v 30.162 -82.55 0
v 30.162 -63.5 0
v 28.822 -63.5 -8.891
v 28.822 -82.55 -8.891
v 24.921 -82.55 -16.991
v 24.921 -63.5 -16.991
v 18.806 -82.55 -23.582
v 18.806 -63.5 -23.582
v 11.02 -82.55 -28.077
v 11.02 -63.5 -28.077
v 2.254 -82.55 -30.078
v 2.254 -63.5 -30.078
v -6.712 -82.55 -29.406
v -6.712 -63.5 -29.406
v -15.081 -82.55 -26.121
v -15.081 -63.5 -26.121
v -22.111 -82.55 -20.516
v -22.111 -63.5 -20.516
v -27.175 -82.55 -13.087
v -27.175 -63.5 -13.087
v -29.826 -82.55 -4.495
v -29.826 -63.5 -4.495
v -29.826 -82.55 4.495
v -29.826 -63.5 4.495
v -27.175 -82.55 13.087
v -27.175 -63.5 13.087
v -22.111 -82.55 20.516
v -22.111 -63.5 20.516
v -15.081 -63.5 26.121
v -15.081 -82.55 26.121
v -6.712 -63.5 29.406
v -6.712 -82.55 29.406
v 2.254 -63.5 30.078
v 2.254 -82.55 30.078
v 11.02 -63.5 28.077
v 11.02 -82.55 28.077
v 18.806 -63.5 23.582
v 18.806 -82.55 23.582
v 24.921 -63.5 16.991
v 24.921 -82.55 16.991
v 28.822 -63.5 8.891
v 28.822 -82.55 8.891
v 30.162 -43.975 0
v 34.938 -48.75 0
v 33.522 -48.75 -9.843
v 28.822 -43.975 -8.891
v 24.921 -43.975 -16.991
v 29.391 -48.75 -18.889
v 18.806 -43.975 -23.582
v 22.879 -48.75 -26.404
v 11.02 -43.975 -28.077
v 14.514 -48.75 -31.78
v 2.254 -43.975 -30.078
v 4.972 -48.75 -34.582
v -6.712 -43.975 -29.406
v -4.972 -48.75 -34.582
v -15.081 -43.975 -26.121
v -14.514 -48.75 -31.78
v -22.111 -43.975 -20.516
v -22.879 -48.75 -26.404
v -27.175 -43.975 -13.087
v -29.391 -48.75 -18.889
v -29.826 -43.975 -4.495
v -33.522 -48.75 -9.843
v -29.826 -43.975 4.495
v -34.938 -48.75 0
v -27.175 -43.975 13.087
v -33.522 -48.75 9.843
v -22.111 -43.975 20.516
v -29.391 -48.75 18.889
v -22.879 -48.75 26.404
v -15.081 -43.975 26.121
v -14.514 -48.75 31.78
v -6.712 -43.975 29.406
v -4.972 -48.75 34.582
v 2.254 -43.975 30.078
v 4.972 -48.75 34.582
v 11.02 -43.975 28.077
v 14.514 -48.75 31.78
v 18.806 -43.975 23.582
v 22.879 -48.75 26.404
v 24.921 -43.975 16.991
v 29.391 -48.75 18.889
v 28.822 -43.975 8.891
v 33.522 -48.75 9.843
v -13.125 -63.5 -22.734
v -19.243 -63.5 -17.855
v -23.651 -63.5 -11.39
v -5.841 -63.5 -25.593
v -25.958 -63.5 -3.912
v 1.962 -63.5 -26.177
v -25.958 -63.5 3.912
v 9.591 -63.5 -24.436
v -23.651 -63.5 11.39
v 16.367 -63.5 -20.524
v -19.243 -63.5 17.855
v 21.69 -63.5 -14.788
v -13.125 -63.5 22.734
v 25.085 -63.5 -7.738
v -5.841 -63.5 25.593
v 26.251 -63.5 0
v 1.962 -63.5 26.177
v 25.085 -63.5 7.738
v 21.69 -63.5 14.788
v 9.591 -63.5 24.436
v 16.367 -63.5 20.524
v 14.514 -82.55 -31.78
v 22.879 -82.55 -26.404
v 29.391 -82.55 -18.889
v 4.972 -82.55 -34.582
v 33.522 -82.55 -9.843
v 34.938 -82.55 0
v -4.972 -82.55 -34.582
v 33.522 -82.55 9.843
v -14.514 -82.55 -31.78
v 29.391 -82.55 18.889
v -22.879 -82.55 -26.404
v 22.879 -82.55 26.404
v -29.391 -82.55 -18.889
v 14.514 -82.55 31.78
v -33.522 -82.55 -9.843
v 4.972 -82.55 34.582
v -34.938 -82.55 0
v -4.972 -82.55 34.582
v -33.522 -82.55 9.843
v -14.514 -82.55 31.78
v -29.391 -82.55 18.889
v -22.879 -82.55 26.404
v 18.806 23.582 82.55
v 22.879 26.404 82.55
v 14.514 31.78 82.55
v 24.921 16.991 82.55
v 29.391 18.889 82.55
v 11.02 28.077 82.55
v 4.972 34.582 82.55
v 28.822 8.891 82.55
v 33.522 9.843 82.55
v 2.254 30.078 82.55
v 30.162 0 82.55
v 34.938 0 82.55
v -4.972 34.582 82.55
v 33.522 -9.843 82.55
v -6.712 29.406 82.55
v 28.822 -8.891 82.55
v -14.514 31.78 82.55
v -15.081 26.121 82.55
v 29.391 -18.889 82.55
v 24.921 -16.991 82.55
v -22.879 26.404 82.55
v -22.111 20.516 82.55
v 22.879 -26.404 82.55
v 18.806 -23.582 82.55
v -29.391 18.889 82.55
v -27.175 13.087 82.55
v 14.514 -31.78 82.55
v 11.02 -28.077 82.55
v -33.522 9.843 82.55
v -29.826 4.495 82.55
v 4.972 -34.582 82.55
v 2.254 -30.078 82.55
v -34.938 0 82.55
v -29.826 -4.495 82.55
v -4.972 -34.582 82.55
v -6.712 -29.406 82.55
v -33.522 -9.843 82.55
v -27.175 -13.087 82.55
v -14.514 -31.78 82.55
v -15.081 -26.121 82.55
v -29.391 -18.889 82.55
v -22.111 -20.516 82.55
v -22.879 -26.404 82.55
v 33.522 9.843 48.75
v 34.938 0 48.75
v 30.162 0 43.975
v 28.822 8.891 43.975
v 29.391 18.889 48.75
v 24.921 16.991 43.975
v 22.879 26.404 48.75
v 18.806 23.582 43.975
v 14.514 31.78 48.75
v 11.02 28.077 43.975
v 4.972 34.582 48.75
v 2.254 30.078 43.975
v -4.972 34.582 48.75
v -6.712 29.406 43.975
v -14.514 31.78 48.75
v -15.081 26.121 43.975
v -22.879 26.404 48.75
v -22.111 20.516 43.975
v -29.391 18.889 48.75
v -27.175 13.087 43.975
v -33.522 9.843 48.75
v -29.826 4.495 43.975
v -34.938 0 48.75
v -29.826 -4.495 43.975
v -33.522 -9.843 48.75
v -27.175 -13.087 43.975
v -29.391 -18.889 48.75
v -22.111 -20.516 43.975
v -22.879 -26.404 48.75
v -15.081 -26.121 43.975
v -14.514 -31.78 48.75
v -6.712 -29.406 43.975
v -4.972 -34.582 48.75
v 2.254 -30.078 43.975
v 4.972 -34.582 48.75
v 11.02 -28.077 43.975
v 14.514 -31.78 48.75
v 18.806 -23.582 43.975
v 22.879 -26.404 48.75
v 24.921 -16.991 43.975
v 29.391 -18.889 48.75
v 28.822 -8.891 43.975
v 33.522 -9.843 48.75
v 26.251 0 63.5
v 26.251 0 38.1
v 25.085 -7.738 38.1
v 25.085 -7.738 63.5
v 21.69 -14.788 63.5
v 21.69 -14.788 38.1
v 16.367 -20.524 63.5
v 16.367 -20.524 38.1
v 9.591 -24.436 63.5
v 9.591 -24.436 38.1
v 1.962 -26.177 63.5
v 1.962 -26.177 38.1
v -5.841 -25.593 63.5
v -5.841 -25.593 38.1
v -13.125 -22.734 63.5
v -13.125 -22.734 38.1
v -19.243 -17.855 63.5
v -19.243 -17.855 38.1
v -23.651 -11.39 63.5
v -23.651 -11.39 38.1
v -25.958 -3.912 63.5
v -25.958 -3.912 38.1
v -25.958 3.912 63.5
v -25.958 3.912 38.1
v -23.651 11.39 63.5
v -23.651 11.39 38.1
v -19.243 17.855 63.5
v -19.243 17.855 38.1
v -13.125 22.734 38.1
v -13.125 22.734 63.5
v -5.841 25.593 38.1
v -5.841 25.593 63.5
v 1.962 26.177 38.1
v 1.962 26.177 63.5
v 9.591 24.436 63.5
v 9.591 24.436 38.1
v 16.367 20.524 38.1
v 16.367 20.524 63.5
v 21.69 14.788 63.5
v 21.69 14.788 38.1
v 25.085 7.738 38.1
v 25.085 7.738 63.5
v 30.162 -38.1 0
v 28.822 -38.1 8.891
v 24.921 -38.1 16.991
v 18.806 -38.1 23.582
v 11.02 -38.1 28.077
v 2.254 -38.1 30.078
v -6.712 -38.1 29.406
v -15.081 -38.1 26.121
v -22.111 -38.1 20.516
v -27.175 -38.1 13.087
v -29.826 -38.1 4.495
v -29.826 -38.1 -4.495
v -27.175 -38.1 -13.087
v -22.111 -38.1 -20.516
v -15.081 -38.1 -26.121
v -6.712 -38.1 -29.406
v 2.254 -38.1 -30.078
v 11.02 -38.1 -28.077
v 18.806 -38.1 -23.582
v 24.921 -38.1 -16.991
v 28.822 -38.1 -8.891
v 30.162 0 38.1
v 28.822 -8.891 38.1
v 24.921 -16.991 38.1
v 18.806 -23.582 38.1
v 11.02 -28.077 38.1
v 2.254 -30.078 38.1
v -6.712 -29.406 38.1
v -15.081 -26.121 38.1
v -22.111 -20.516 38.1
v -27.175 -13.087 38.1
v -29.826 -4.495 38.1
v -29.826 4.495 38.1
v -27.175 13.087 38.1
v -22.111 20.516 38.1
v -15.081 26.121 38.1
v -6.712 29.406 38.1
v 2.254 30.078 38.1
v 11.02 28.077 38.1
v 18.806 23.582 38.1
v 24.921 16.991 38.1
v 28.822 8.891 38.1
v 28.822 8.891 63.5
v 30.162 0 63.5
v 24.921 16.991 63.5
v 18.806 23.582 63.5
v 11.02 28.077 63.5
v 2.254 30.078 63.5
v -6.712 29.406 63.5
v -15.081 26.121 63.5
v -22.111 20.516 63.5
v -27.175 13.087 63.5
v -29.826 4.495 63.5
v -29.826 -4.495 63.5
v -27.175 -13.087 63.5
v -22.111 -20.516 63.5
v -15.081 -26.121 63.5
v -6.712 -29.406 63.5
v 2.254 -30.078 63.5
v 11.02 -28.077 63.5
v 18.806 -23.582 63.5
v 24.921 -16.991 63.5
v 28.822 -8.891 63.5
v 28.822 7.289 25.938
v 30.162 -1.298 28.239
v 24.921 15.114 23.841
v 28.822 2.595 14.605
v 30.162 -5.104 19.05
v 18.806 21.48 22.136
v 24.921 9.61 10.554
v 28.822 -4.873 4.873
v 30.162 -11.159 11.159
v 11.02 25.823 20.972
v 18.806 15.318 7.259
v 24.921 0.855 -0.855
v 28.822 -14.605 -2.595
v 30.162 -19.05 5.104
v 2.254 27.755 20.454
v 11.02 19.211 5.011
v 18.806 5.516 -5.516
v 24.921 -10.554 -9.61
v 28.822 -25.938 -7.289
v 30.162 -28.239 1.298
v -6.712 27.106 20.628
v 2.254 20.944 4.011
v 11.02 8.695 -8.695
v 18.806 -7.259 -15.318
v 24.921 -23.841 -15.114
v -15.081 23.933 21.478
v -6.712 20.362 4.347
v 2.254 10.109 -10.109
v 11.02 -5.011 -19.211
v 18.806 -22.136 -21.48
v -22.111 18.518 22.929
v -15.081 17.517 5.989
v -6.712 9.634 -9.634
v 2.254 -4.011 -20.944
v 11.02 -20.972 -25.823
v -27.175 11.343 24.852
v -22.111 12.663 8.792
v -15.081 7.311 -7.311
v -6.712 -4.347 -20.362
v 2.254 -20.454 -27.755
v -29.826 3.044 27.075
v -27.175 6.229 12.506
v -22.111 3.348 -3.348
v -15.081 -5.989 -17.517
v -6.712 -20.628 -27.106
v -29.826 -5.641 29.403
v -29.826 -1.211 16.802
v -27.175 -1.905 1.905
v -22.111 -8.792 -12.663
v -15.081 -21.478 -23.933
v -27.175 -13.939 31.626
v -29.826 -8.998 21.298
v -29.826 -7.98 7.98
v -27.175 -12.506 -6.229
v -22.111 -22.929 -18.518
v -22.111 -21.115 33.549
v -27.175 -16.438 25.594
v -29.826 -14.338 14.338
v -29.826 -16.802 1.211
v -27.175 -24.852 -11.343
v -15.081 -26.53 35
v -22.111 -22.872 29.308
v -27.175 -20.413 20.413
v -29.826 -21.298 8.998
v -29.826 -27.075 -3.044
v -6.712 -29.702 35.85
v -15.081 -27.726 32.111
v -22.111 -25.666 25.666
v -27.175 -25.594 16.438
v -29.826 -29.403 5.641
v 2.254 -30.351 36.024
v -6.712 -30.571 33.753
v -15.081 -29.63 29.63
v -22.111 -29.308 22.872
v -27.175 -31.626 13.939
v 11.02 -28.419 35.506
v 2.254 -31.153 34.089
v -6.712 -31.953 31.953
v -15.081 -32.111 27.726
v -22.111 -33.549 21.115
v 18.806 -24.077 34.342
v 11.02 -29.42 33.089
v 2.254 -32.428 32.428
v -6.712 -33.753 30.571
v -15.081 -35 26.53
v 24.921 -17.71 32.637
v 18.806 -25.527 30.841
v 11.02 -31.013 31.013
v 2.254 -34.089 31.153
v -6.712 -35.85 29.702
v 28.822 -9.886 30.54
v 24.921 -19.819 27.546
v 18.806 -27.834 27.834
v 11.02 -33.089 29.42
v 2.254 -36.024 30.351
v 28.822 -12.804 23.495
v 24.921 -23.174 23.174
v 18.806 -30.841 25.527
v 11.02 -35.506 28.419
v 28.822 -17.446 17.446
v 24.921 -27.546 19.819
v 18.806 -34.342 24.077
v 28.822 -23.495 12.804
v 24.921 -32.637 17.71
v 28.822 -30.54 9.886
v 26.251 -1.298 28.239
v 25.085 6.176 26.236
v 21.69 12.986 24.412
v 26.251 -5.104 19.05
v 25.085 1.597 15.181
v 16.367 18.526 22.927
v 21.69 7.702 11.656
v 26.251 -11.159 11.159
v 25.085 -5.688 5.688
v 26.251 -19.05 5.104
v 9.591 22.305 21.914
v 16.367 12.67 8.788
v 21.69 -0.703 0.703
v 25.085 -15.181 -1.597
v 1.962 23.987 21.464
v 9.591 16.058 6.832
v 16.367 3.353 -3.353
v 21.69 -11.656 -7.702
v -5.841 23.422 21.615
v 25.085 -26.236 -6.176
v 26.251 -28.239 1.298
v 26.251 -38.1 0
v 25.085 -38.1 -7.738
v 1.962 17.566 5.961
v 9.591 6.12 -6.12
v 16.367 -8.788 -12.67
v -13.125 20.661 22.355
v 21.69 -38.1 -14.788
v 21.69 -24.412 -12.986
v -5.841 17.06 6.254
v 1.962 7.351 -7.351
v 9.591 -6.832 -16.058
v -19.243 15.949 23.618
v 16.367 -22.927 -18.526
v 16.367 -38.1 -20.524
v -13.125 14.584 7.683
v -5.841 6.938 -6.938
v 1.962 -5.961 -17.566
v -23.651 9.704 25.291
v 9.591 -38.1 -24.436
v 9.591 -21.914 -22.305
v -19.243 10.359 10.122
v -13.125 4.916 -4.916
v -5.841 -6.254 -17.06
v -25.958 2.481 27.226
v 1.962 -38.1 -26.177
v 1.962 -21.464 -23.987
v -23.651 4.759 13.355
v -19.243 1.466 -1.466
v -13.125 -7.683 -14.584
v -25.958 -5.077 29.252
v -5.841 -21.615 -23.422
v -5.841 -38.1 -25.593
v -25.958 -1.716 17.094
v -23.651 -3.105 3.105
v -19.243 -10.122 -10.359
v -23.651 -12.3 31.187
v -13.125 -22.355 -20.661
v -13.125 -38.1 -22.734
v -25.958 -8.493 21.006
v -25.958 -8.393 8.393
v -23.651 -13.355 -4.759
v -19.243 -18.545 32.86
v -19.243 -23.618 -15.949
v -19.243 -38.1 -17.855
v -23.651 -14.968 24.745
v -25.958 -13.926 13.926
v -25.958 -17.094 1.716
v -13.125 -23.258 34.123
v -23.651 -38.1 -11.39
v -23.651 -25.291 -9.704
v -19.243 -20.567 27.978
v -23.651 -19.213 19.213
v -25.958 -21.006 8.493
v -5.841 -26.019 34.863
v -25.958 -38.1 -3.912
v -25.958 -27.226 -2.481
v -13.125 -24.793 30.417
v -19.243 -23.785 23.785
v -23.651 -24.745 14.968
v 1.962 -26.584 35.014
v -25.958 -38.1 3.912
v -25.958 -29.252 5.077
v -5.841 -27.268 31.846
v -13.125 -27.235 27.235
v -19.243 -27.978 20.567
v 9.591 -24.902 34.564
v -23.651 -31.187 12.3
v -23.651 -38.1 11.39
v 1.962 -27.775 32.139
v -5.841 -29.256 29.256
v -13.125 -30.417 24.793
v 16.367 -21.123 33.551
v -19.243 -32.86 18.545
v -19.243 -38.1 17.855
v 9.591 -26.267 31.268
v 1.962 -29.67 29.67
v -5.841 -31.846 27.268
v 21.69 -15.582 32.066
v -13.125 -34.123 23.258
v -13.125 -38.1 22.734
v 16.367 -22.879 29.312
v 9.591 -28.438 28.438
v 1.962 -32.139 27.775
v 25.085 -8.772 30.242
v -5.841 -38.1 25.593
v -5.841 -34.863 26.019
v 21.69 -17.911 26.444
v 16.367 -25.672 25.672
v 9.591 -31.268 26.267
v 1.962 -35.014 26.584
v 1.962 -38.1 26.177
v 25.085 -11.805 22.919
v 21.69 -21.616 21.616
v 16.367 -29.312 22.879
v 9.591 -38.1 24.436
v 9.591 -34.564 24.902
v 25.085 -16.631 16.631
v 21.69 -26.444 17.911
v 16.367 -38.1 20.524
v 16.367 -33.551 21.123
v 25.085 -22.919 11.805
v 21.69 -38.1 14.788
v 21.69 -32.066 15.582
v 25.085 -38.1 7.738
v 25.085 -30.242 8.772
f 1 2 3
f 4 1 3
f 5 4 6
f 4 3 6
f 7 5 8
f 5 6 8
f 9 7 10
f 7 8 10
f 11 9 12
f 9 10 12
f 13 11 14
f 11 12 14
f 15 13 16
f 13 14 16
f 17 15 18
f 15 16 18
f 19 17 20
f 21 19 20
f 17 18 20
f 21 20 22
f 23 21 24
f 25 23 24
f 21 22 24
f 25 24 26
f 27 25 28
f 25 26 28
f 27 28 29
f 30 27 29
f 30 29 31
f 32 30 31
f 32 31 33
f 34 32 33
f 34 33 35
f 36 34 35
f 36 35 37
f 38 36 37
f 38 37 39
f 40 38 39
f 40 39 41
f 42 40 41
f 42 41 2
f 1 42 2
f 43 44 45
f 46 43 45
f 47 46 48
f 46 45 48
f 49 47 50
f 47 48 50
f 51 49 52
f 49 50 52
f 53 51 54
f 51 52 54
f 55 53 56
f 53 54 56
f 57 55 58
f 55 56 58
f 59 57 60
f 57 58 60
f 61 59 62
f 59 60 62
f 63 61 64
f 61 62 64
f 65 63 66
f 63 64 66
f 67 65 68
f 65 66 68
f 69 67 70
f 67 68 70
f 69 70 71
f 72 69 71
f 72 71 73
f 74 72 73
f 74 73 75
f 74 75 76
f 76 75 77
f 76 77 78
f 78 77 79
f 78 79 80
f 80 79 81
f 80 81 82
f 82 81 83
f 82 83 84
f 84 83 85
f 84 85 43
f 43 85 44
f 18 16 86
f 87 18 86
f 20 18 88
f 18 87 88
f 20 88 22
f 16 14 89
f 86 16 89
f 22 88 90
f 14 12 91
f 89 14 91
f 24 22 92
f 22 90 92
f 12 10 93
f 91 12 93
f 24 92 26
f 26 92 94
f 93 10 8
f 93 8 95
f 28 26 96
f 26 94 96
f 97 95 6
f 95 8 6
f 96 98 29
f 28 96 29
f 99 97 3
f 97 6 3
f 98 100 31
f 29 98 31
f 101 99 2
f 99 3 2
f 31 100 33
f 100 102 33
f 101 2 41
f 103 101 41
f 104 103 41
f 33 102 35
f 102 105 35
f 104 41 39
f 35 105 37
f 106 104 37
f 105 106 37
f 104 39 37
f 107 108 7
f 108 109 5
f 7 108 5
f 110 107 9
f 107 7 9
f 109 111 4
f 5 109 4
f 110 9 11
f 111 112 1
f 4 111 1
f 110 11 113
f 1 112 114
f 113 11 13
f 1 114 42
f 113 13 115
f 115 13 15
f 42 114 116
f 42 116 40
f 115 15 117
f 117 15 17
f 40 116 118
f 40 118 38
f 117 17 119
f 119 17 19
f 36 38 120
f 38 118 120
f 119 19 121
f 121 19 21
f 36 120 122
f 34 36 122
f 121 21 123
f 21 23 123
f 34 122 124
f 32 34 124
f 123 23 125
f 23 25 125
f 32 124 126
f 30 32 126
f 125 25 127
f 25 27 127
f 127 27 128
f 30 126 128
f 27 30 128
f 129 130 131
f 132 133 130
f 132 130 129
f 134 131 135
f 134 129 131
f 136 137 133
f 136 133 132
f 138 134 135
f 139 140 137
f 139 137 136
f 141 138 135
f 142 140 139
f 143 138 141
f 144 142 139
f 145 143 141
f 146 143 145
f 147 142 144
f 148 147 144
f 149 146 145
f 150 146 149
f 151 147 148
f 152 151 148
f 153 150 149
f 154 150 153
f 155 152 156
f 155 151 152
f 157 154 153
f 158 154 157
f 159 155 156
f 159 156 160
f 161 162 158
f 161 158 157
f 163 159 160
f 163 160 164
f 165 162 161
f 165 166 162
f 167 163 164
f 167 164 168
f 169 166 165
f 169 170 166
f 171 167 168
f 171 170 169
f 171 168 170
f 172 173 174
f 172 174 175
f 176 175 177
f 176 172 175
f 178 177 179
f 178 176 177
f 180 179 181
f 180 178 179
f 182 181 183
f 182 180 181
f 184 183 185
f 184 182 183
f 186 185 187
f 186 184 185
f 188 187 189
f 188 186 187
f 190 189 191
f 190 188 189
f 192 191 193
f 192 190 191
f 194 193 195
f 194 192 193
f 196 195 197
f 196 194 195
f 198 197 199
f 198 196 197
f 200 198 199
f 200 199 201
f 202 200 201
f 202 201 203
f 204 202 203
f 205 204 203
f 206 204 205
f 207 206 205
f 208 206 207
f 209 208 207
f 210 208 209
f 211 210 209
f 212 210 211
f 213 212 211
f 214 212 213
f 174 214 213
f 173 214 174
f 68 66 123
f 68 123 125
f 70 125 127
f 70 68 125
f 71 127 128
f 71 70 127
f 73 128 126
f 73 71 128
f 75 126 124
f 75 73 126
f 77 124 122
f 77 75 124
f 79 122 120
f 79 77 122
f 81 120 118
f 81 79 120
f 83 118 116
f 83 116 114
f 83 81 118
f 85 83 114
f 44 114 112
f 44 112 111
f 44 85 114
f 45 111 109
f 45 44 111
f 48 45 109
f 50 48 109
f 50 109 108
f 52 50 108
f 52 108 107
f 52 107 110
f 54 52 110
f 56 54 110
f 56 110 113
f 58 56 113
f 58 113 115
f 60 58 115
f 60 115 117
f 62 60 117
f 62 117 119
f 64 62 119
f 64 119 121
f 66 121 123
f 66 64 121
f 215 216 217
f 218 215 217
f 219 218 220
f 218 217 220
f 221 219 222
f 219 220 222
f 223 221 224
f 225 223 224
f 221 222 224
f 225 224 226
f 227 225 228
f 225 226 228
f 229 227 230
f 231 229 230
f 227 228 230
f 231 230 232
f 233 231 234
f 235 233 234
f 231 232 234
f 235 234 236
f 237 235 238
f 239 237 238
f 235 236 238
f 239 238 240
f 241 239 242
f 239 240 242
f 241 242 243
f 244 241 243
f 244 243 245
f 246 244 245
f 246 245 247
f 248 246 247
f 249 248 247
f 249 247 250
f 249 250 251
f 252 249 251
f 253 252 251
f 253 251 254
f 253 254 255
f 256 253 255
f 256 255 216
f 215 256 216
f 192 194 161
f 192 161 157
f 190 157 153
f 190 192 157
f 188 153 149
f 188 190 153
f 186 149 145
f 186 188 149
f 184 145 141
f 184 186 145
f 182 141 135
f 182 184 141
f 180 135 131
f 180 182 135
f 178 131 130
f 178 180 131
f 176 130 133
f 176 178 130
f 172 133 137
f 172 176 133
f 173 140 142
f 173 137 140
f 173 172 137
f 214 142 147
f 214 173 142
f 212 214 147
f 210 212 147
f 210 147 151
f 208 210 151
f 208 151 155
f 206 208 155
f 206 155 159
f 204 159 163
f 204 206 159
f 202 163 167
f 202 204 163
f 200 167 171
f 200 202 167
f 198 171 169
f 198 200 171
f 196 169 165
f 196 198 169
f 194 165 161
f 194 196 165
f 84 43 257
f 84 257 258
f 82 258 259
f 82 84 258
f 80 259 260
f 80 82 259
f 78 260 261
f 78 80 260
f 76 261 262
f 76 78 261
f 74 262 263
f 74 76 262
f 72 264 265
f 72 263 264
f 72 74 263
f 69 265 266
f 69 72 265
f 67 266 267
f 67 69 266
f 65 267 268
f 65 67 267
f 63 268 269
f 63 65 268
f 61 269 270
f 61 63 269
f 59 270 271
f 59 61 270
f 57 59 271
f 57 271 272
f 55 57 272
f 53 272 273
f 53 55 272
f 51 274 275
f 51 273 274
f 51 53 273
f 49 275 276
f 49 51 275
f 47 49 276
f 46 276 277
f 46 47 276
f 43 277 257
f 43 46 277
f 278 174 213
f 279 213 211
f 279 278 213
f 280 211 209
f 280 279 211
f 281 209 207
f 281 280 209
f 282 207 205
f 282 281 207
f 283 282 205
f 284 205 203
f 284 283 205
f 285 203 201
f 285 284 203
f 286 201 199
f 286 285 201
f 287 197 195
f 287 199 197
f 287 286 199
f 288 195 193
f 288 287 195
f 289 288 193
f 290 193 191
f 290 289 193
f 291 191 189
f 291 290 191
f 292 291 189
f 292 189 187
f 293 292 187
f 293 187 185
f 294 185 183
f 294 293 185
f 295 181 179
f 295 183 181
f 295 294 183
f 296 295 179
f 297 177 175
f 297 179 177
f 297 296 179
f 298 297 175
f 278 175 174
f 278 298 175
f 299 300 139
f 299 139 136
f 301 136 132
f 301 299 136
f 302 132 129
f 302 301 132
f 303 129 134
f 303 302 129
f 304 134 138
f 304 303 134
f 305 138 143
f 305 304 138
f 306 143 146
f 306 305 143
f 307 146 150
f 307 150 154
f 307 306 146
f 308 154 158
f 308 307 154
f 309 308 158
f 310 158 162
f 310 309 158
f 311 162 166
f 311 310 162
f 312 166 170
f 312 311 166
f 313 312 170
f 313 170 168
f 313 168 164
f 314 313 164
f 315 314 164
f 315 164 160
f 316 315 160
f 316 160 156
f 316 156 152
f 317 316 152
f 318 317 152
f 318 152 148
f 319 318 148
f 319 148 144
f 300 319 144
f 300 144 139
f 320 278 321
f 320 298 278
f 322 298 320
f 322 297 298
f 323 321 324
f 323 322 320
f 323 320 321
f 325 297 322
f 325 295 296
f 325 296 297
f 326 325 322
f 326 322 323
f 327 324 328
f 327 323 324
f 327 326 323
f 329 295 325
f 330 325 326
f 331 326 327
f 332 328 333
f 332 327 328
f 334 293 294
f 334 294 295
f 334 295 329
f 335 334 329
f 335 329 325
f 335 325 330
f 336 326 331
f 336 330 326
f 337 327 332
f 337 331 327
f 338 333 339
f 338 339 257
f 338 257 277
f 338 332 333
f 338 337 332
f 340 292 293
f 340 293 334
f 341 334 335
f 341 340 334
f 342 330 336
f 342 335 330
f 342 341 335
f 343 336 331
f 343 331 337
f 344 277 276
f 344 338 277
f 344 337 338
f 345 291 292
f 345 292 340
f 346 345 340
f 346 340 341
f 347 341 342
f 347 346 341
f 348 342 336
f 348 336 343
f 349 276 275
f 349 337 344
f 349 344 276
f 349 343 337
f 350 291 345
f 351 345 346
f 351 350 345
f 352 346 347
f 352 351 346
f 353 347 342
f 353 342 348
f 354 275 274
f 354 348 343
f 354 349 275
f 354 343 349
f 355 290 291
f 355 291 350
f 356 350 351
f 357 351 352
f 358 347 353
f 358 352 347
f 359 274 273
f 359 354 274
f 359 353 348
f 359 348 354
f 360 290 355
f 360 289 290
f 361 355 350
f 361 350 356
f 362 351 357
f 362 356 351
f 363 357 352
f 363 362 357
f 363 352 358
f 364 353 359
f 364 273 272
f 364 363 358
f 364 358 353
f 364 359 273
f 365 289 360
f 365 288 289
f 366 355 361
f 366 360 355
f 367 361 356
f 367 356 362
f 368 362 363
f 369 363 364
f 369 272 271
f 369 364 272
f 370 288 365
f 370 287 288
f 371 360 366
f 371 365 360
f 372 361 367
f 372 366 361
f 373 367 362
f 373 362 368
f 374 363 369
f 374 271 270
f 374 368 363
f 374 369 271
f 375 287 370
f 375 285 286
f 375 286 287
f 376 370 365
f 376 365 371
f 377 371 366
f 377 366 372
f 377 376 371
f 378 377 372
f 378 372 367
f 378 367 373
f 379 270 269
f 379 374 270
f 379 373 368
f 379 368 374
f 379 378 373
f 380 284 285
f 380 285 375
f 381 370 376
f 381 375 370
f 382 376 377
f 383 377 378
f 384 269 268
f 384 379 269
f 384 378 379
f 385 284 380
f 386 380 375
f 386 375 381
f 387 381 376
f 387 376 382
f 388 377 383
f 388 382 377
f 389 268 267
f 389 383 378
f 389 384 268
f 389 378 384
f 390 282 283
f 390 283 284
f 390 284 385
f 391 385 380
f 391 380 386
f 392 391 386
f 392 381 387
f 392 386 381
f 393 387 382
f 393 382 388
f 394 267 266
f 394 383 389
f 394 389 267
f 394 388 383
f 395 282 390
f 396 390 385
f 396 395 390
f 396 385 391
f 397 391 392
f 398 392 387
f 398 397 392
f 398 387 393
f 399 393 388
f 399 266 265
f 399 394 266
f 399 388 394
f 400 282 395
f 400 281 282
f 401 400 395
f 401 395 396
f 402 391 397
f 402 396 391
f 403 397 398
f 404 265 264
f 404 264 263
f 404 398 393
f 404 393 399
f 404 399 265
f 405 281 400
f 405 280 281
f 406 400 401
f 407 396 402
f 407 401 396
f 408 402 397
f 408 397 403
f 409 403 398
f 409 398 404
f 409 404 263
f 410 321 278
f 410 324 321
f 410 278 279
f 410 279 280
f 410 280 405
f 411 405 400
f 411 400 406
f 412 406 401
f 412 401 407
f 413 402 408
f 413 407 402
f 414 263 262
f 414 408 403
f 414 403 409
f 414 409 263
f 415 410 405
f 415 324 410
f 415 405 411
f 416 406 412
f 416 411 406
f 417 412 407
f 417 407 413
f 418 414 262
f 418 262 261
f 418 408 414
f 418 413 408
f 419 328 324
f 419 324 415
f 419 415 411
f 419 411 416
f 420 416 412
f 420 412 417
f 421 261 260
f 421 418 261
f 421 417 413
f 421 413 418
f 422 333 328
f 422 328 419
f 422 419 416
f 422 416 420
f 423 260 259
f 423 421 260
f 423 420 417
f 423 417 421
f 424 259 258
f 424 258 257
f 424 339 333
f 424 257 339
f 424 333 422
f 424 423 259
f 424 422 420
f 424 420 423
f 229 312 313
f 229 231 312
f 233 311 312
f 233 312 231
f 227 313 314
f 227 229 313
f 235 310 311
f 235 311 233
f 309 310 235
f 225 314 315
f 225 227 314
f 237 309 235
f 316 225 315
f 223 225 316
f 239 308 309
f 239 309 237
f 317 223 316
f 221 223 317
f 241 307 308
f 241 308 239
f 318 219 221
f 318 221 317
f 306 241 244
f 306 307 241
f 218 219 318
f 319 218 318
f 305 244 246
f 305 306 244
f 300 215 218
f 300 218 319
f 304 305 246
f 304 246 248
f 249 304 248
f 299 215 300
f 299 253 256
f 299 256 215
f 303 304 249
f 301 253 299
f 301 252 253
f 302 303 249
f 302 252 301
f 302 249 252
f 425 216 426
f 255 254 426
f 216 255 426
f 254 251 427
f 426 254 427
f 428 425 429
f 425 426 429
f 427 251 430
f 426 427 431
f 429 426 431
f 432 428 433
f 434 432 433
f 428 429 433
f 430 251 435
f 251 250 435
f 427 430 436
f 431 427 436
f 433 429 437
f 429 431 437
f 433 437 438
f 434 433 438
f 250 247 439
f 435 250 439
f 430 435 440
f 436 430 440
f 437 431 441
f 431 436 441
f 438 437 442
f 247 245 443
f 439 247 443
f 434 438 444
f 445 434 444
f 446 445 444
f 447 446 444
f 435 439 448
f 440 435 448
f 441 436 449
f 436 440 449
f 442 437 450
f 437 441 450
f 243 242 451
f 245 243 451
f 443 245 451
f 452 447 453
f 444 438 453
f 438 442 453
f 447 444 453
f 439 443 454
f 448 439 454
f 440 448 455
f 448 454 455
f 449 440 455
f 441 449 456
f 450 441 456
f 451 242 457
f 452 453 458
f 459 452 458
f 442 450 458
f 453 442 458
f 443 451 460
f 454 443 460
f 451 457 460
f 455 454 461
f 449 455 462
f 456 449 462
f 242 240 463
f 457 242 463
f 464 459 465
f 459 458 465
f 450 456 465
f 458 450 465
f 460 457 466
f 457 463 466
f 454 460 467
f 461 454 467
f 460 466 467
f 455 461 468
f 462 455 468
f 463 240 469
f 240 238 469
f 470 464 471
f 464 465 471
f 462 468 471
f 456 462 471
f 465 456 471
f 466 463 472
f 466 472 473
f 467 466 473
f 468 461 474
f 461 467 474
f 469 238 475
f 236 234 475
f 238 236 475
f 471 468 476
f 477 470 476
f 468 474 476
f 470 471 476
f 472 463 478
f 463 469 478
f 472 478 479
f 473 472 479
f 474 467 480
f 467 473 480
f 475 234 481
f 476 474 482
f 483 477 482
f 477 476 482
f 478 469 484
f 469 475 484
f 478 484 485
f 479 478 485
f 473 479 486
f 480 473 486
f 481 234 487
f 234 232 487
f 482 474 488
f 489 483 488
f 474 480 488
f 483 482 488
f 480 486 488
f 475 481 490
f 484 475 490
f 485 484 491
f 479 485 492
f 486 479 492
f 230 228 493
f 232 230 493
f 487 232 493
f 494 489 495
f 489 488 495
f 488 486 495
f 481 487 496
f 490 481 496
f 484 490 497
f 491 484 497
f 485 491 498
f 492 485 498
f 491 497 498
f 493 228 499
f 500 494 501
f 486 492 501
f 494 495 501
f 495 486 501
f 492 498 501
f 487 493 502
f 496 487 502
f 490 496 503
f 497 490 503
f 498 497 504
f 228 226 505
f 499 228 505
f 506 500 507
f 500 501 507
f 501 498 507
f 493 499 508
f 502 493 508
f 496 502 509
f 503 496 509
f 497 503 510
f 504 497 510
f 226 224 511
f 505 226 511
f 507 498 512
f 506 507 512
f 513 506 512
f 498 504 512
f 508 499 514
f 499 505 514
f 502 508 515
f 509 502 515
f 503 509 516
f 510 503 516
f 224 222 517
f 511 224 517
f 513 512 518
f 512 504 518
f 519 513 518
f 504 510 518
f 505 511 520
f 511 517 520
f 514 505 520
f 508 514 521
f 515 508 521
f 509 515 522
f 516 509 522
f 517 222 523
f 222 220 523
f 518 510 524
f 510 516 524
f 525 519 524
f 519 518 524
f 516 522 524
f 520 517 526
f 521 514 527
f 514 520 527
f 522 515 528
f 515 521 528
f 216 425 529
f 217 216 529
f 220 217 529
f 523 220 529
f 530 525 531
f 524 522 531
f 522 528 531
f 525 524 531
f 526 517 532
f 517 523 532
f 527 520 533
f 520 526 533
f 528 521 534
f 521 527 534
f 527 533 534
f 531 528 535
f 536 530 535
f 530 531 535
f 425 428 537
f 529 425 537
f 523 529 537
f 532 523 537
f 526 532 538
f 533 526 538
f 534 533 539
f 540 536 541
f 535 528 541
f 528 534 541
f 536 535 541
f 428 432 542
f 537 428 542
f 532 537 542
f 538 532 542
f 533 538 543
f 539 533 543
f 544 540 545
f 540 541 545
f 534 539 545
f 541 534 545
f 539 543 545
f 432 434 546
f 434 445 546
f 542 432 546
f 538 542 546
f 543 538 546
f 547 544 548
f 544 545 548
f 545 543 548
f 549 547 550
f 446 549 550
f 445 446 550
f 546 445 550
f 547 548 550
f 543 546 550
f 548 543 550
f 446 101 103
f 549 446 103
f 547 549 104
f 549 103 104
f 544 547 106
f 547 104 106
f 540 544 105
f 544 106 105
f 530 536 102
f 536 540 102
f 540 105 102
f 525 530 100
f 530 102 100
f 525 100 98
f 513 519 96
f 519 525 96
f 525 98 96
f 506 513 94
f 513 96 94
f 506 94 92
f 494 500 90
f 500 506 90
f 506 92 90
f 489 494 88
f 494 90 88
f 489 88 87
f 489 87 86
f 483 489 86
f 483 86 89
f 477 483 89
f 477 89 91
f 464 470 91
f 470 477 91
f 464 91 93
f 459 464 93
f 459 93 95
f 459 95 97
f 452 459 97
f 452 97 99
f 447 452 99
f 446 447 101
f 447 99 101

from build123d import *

# Parameters (mm, degrees)
SKETCH2_R           = 30.1625
SKETCH2_R_2         = 26.2509
BOSS_EXTRUDE1_START = -9.525
SKETCH9_R           = 34.9377
SKETCH9_R_2         = 30.1625
BOSS_EXTRUDE1_DEPTH = 28.575
CHAMFER1_SIZE       = 10


with BuildPart() as part:
    # Sweep2: sweep along a path in Sketch1
    with BuildLine(Plane(origin=(0, 0, 0), x_dir=(0, 0, -1), z_dir=(1, 0, 0))) as sweep2_path:
        Line((-63.5, 0), (-38.1, 0))
        ThreePointArc((-38.1, 0), (-11.159231637, -11.159231637), (0, -38.1))
        Line((0, -38.1), (0, -63.5))
    # Sketch2 → Sweep2 (sweep)
    with BuildSketch(Plane.XY.offset(63.5)):
        Circle(SKETCH2_R)
        Circle(SKETCH2_R_2, mode=Mode.SUBTRACT)
    sweep(path=sweep2_path.line)

    # Sketch9 → Boss-Extrude1 (add)
    with BuildSketch(Plane.XY.offset(63.5).offset(BOSS_EXTRUDE1_START)):
        with Locations(Location((0, 0, 0), (0, 0, 180))):
            Circle(SKETCH9_R)
        Circle(SKETCH9_R_2, mode=Mode.SUBTRACT)
    boss_extrude1 = extrude(amount=BOSS_EXTRUDE1_DEPTH)

    # Mirror4: Boss-Extrude1 across plane
    add(boss_extrude1.mirror(Plane(origin=(0, 0, 0), x_dir=(0, -0.7071067811865465, 0.7071067811865486), z_dir=(0, 0.7071067811865488, 0.7071067811865464))))

    # Chamfer1
    # the kernel refuses this chamfer: 10 mm, written as the material it adds along each edge
    with BuildSketch(Plane(origin=(0, 0, 53.975), x_dir=(1, 0, 0), z_dir=(0, -1, 0))) as chamfer1_piece_1_section:
        Polygon((30.1625, -CHAMFER1_SIZE), (30.1625 + CHAMFER1_SIZE, 0), (30.1625, 0), align=None)
    chamfer1_piece_1 = revolve(axis=Axis((0, 0, 53.975), (0, 0, 1)), mode=Mode.PRIVATE)
    chamfer1_piece_1 = chamfer1_piece_1 & Plane(origin=(0, 0, 46.362739963), x_dir=(-1, 0, 0), z_dir=(0, 0, -1)) * Cylinder(34.9377, 161, mode=Mode.PRIVATE)
    add(chamfer1_piece_1)
    with BuildSketch(Plane(origin=(0, -53.975, 0), x_dir=(1, 0, 0), z_dir=(0, 0, 1))) as chamfer1_piece_2_section:
        Polygon((30.1625, CHAMFER1_SIZE), (30.1625 + CHAMFER1_SIZE, 0), (30.1625, 0), align=None)
    chamfer1_piece_2 = revolve(axis=Axis((0, -53.975, 0), (0, 1, 0)), mode=Mode.PRIVATE)
    chamfer1_piece_2 = chamfer1_piece_2 & Plane(origin=(0, -46.362739963, 0), x_dir=(-1, 0, 0), z_dir=(0, 1, 0)) * Cylinder(34.9377, 161, mode=Mode.PRIVATE)
    add(chamfer1_piece_2)


solid = part.part
